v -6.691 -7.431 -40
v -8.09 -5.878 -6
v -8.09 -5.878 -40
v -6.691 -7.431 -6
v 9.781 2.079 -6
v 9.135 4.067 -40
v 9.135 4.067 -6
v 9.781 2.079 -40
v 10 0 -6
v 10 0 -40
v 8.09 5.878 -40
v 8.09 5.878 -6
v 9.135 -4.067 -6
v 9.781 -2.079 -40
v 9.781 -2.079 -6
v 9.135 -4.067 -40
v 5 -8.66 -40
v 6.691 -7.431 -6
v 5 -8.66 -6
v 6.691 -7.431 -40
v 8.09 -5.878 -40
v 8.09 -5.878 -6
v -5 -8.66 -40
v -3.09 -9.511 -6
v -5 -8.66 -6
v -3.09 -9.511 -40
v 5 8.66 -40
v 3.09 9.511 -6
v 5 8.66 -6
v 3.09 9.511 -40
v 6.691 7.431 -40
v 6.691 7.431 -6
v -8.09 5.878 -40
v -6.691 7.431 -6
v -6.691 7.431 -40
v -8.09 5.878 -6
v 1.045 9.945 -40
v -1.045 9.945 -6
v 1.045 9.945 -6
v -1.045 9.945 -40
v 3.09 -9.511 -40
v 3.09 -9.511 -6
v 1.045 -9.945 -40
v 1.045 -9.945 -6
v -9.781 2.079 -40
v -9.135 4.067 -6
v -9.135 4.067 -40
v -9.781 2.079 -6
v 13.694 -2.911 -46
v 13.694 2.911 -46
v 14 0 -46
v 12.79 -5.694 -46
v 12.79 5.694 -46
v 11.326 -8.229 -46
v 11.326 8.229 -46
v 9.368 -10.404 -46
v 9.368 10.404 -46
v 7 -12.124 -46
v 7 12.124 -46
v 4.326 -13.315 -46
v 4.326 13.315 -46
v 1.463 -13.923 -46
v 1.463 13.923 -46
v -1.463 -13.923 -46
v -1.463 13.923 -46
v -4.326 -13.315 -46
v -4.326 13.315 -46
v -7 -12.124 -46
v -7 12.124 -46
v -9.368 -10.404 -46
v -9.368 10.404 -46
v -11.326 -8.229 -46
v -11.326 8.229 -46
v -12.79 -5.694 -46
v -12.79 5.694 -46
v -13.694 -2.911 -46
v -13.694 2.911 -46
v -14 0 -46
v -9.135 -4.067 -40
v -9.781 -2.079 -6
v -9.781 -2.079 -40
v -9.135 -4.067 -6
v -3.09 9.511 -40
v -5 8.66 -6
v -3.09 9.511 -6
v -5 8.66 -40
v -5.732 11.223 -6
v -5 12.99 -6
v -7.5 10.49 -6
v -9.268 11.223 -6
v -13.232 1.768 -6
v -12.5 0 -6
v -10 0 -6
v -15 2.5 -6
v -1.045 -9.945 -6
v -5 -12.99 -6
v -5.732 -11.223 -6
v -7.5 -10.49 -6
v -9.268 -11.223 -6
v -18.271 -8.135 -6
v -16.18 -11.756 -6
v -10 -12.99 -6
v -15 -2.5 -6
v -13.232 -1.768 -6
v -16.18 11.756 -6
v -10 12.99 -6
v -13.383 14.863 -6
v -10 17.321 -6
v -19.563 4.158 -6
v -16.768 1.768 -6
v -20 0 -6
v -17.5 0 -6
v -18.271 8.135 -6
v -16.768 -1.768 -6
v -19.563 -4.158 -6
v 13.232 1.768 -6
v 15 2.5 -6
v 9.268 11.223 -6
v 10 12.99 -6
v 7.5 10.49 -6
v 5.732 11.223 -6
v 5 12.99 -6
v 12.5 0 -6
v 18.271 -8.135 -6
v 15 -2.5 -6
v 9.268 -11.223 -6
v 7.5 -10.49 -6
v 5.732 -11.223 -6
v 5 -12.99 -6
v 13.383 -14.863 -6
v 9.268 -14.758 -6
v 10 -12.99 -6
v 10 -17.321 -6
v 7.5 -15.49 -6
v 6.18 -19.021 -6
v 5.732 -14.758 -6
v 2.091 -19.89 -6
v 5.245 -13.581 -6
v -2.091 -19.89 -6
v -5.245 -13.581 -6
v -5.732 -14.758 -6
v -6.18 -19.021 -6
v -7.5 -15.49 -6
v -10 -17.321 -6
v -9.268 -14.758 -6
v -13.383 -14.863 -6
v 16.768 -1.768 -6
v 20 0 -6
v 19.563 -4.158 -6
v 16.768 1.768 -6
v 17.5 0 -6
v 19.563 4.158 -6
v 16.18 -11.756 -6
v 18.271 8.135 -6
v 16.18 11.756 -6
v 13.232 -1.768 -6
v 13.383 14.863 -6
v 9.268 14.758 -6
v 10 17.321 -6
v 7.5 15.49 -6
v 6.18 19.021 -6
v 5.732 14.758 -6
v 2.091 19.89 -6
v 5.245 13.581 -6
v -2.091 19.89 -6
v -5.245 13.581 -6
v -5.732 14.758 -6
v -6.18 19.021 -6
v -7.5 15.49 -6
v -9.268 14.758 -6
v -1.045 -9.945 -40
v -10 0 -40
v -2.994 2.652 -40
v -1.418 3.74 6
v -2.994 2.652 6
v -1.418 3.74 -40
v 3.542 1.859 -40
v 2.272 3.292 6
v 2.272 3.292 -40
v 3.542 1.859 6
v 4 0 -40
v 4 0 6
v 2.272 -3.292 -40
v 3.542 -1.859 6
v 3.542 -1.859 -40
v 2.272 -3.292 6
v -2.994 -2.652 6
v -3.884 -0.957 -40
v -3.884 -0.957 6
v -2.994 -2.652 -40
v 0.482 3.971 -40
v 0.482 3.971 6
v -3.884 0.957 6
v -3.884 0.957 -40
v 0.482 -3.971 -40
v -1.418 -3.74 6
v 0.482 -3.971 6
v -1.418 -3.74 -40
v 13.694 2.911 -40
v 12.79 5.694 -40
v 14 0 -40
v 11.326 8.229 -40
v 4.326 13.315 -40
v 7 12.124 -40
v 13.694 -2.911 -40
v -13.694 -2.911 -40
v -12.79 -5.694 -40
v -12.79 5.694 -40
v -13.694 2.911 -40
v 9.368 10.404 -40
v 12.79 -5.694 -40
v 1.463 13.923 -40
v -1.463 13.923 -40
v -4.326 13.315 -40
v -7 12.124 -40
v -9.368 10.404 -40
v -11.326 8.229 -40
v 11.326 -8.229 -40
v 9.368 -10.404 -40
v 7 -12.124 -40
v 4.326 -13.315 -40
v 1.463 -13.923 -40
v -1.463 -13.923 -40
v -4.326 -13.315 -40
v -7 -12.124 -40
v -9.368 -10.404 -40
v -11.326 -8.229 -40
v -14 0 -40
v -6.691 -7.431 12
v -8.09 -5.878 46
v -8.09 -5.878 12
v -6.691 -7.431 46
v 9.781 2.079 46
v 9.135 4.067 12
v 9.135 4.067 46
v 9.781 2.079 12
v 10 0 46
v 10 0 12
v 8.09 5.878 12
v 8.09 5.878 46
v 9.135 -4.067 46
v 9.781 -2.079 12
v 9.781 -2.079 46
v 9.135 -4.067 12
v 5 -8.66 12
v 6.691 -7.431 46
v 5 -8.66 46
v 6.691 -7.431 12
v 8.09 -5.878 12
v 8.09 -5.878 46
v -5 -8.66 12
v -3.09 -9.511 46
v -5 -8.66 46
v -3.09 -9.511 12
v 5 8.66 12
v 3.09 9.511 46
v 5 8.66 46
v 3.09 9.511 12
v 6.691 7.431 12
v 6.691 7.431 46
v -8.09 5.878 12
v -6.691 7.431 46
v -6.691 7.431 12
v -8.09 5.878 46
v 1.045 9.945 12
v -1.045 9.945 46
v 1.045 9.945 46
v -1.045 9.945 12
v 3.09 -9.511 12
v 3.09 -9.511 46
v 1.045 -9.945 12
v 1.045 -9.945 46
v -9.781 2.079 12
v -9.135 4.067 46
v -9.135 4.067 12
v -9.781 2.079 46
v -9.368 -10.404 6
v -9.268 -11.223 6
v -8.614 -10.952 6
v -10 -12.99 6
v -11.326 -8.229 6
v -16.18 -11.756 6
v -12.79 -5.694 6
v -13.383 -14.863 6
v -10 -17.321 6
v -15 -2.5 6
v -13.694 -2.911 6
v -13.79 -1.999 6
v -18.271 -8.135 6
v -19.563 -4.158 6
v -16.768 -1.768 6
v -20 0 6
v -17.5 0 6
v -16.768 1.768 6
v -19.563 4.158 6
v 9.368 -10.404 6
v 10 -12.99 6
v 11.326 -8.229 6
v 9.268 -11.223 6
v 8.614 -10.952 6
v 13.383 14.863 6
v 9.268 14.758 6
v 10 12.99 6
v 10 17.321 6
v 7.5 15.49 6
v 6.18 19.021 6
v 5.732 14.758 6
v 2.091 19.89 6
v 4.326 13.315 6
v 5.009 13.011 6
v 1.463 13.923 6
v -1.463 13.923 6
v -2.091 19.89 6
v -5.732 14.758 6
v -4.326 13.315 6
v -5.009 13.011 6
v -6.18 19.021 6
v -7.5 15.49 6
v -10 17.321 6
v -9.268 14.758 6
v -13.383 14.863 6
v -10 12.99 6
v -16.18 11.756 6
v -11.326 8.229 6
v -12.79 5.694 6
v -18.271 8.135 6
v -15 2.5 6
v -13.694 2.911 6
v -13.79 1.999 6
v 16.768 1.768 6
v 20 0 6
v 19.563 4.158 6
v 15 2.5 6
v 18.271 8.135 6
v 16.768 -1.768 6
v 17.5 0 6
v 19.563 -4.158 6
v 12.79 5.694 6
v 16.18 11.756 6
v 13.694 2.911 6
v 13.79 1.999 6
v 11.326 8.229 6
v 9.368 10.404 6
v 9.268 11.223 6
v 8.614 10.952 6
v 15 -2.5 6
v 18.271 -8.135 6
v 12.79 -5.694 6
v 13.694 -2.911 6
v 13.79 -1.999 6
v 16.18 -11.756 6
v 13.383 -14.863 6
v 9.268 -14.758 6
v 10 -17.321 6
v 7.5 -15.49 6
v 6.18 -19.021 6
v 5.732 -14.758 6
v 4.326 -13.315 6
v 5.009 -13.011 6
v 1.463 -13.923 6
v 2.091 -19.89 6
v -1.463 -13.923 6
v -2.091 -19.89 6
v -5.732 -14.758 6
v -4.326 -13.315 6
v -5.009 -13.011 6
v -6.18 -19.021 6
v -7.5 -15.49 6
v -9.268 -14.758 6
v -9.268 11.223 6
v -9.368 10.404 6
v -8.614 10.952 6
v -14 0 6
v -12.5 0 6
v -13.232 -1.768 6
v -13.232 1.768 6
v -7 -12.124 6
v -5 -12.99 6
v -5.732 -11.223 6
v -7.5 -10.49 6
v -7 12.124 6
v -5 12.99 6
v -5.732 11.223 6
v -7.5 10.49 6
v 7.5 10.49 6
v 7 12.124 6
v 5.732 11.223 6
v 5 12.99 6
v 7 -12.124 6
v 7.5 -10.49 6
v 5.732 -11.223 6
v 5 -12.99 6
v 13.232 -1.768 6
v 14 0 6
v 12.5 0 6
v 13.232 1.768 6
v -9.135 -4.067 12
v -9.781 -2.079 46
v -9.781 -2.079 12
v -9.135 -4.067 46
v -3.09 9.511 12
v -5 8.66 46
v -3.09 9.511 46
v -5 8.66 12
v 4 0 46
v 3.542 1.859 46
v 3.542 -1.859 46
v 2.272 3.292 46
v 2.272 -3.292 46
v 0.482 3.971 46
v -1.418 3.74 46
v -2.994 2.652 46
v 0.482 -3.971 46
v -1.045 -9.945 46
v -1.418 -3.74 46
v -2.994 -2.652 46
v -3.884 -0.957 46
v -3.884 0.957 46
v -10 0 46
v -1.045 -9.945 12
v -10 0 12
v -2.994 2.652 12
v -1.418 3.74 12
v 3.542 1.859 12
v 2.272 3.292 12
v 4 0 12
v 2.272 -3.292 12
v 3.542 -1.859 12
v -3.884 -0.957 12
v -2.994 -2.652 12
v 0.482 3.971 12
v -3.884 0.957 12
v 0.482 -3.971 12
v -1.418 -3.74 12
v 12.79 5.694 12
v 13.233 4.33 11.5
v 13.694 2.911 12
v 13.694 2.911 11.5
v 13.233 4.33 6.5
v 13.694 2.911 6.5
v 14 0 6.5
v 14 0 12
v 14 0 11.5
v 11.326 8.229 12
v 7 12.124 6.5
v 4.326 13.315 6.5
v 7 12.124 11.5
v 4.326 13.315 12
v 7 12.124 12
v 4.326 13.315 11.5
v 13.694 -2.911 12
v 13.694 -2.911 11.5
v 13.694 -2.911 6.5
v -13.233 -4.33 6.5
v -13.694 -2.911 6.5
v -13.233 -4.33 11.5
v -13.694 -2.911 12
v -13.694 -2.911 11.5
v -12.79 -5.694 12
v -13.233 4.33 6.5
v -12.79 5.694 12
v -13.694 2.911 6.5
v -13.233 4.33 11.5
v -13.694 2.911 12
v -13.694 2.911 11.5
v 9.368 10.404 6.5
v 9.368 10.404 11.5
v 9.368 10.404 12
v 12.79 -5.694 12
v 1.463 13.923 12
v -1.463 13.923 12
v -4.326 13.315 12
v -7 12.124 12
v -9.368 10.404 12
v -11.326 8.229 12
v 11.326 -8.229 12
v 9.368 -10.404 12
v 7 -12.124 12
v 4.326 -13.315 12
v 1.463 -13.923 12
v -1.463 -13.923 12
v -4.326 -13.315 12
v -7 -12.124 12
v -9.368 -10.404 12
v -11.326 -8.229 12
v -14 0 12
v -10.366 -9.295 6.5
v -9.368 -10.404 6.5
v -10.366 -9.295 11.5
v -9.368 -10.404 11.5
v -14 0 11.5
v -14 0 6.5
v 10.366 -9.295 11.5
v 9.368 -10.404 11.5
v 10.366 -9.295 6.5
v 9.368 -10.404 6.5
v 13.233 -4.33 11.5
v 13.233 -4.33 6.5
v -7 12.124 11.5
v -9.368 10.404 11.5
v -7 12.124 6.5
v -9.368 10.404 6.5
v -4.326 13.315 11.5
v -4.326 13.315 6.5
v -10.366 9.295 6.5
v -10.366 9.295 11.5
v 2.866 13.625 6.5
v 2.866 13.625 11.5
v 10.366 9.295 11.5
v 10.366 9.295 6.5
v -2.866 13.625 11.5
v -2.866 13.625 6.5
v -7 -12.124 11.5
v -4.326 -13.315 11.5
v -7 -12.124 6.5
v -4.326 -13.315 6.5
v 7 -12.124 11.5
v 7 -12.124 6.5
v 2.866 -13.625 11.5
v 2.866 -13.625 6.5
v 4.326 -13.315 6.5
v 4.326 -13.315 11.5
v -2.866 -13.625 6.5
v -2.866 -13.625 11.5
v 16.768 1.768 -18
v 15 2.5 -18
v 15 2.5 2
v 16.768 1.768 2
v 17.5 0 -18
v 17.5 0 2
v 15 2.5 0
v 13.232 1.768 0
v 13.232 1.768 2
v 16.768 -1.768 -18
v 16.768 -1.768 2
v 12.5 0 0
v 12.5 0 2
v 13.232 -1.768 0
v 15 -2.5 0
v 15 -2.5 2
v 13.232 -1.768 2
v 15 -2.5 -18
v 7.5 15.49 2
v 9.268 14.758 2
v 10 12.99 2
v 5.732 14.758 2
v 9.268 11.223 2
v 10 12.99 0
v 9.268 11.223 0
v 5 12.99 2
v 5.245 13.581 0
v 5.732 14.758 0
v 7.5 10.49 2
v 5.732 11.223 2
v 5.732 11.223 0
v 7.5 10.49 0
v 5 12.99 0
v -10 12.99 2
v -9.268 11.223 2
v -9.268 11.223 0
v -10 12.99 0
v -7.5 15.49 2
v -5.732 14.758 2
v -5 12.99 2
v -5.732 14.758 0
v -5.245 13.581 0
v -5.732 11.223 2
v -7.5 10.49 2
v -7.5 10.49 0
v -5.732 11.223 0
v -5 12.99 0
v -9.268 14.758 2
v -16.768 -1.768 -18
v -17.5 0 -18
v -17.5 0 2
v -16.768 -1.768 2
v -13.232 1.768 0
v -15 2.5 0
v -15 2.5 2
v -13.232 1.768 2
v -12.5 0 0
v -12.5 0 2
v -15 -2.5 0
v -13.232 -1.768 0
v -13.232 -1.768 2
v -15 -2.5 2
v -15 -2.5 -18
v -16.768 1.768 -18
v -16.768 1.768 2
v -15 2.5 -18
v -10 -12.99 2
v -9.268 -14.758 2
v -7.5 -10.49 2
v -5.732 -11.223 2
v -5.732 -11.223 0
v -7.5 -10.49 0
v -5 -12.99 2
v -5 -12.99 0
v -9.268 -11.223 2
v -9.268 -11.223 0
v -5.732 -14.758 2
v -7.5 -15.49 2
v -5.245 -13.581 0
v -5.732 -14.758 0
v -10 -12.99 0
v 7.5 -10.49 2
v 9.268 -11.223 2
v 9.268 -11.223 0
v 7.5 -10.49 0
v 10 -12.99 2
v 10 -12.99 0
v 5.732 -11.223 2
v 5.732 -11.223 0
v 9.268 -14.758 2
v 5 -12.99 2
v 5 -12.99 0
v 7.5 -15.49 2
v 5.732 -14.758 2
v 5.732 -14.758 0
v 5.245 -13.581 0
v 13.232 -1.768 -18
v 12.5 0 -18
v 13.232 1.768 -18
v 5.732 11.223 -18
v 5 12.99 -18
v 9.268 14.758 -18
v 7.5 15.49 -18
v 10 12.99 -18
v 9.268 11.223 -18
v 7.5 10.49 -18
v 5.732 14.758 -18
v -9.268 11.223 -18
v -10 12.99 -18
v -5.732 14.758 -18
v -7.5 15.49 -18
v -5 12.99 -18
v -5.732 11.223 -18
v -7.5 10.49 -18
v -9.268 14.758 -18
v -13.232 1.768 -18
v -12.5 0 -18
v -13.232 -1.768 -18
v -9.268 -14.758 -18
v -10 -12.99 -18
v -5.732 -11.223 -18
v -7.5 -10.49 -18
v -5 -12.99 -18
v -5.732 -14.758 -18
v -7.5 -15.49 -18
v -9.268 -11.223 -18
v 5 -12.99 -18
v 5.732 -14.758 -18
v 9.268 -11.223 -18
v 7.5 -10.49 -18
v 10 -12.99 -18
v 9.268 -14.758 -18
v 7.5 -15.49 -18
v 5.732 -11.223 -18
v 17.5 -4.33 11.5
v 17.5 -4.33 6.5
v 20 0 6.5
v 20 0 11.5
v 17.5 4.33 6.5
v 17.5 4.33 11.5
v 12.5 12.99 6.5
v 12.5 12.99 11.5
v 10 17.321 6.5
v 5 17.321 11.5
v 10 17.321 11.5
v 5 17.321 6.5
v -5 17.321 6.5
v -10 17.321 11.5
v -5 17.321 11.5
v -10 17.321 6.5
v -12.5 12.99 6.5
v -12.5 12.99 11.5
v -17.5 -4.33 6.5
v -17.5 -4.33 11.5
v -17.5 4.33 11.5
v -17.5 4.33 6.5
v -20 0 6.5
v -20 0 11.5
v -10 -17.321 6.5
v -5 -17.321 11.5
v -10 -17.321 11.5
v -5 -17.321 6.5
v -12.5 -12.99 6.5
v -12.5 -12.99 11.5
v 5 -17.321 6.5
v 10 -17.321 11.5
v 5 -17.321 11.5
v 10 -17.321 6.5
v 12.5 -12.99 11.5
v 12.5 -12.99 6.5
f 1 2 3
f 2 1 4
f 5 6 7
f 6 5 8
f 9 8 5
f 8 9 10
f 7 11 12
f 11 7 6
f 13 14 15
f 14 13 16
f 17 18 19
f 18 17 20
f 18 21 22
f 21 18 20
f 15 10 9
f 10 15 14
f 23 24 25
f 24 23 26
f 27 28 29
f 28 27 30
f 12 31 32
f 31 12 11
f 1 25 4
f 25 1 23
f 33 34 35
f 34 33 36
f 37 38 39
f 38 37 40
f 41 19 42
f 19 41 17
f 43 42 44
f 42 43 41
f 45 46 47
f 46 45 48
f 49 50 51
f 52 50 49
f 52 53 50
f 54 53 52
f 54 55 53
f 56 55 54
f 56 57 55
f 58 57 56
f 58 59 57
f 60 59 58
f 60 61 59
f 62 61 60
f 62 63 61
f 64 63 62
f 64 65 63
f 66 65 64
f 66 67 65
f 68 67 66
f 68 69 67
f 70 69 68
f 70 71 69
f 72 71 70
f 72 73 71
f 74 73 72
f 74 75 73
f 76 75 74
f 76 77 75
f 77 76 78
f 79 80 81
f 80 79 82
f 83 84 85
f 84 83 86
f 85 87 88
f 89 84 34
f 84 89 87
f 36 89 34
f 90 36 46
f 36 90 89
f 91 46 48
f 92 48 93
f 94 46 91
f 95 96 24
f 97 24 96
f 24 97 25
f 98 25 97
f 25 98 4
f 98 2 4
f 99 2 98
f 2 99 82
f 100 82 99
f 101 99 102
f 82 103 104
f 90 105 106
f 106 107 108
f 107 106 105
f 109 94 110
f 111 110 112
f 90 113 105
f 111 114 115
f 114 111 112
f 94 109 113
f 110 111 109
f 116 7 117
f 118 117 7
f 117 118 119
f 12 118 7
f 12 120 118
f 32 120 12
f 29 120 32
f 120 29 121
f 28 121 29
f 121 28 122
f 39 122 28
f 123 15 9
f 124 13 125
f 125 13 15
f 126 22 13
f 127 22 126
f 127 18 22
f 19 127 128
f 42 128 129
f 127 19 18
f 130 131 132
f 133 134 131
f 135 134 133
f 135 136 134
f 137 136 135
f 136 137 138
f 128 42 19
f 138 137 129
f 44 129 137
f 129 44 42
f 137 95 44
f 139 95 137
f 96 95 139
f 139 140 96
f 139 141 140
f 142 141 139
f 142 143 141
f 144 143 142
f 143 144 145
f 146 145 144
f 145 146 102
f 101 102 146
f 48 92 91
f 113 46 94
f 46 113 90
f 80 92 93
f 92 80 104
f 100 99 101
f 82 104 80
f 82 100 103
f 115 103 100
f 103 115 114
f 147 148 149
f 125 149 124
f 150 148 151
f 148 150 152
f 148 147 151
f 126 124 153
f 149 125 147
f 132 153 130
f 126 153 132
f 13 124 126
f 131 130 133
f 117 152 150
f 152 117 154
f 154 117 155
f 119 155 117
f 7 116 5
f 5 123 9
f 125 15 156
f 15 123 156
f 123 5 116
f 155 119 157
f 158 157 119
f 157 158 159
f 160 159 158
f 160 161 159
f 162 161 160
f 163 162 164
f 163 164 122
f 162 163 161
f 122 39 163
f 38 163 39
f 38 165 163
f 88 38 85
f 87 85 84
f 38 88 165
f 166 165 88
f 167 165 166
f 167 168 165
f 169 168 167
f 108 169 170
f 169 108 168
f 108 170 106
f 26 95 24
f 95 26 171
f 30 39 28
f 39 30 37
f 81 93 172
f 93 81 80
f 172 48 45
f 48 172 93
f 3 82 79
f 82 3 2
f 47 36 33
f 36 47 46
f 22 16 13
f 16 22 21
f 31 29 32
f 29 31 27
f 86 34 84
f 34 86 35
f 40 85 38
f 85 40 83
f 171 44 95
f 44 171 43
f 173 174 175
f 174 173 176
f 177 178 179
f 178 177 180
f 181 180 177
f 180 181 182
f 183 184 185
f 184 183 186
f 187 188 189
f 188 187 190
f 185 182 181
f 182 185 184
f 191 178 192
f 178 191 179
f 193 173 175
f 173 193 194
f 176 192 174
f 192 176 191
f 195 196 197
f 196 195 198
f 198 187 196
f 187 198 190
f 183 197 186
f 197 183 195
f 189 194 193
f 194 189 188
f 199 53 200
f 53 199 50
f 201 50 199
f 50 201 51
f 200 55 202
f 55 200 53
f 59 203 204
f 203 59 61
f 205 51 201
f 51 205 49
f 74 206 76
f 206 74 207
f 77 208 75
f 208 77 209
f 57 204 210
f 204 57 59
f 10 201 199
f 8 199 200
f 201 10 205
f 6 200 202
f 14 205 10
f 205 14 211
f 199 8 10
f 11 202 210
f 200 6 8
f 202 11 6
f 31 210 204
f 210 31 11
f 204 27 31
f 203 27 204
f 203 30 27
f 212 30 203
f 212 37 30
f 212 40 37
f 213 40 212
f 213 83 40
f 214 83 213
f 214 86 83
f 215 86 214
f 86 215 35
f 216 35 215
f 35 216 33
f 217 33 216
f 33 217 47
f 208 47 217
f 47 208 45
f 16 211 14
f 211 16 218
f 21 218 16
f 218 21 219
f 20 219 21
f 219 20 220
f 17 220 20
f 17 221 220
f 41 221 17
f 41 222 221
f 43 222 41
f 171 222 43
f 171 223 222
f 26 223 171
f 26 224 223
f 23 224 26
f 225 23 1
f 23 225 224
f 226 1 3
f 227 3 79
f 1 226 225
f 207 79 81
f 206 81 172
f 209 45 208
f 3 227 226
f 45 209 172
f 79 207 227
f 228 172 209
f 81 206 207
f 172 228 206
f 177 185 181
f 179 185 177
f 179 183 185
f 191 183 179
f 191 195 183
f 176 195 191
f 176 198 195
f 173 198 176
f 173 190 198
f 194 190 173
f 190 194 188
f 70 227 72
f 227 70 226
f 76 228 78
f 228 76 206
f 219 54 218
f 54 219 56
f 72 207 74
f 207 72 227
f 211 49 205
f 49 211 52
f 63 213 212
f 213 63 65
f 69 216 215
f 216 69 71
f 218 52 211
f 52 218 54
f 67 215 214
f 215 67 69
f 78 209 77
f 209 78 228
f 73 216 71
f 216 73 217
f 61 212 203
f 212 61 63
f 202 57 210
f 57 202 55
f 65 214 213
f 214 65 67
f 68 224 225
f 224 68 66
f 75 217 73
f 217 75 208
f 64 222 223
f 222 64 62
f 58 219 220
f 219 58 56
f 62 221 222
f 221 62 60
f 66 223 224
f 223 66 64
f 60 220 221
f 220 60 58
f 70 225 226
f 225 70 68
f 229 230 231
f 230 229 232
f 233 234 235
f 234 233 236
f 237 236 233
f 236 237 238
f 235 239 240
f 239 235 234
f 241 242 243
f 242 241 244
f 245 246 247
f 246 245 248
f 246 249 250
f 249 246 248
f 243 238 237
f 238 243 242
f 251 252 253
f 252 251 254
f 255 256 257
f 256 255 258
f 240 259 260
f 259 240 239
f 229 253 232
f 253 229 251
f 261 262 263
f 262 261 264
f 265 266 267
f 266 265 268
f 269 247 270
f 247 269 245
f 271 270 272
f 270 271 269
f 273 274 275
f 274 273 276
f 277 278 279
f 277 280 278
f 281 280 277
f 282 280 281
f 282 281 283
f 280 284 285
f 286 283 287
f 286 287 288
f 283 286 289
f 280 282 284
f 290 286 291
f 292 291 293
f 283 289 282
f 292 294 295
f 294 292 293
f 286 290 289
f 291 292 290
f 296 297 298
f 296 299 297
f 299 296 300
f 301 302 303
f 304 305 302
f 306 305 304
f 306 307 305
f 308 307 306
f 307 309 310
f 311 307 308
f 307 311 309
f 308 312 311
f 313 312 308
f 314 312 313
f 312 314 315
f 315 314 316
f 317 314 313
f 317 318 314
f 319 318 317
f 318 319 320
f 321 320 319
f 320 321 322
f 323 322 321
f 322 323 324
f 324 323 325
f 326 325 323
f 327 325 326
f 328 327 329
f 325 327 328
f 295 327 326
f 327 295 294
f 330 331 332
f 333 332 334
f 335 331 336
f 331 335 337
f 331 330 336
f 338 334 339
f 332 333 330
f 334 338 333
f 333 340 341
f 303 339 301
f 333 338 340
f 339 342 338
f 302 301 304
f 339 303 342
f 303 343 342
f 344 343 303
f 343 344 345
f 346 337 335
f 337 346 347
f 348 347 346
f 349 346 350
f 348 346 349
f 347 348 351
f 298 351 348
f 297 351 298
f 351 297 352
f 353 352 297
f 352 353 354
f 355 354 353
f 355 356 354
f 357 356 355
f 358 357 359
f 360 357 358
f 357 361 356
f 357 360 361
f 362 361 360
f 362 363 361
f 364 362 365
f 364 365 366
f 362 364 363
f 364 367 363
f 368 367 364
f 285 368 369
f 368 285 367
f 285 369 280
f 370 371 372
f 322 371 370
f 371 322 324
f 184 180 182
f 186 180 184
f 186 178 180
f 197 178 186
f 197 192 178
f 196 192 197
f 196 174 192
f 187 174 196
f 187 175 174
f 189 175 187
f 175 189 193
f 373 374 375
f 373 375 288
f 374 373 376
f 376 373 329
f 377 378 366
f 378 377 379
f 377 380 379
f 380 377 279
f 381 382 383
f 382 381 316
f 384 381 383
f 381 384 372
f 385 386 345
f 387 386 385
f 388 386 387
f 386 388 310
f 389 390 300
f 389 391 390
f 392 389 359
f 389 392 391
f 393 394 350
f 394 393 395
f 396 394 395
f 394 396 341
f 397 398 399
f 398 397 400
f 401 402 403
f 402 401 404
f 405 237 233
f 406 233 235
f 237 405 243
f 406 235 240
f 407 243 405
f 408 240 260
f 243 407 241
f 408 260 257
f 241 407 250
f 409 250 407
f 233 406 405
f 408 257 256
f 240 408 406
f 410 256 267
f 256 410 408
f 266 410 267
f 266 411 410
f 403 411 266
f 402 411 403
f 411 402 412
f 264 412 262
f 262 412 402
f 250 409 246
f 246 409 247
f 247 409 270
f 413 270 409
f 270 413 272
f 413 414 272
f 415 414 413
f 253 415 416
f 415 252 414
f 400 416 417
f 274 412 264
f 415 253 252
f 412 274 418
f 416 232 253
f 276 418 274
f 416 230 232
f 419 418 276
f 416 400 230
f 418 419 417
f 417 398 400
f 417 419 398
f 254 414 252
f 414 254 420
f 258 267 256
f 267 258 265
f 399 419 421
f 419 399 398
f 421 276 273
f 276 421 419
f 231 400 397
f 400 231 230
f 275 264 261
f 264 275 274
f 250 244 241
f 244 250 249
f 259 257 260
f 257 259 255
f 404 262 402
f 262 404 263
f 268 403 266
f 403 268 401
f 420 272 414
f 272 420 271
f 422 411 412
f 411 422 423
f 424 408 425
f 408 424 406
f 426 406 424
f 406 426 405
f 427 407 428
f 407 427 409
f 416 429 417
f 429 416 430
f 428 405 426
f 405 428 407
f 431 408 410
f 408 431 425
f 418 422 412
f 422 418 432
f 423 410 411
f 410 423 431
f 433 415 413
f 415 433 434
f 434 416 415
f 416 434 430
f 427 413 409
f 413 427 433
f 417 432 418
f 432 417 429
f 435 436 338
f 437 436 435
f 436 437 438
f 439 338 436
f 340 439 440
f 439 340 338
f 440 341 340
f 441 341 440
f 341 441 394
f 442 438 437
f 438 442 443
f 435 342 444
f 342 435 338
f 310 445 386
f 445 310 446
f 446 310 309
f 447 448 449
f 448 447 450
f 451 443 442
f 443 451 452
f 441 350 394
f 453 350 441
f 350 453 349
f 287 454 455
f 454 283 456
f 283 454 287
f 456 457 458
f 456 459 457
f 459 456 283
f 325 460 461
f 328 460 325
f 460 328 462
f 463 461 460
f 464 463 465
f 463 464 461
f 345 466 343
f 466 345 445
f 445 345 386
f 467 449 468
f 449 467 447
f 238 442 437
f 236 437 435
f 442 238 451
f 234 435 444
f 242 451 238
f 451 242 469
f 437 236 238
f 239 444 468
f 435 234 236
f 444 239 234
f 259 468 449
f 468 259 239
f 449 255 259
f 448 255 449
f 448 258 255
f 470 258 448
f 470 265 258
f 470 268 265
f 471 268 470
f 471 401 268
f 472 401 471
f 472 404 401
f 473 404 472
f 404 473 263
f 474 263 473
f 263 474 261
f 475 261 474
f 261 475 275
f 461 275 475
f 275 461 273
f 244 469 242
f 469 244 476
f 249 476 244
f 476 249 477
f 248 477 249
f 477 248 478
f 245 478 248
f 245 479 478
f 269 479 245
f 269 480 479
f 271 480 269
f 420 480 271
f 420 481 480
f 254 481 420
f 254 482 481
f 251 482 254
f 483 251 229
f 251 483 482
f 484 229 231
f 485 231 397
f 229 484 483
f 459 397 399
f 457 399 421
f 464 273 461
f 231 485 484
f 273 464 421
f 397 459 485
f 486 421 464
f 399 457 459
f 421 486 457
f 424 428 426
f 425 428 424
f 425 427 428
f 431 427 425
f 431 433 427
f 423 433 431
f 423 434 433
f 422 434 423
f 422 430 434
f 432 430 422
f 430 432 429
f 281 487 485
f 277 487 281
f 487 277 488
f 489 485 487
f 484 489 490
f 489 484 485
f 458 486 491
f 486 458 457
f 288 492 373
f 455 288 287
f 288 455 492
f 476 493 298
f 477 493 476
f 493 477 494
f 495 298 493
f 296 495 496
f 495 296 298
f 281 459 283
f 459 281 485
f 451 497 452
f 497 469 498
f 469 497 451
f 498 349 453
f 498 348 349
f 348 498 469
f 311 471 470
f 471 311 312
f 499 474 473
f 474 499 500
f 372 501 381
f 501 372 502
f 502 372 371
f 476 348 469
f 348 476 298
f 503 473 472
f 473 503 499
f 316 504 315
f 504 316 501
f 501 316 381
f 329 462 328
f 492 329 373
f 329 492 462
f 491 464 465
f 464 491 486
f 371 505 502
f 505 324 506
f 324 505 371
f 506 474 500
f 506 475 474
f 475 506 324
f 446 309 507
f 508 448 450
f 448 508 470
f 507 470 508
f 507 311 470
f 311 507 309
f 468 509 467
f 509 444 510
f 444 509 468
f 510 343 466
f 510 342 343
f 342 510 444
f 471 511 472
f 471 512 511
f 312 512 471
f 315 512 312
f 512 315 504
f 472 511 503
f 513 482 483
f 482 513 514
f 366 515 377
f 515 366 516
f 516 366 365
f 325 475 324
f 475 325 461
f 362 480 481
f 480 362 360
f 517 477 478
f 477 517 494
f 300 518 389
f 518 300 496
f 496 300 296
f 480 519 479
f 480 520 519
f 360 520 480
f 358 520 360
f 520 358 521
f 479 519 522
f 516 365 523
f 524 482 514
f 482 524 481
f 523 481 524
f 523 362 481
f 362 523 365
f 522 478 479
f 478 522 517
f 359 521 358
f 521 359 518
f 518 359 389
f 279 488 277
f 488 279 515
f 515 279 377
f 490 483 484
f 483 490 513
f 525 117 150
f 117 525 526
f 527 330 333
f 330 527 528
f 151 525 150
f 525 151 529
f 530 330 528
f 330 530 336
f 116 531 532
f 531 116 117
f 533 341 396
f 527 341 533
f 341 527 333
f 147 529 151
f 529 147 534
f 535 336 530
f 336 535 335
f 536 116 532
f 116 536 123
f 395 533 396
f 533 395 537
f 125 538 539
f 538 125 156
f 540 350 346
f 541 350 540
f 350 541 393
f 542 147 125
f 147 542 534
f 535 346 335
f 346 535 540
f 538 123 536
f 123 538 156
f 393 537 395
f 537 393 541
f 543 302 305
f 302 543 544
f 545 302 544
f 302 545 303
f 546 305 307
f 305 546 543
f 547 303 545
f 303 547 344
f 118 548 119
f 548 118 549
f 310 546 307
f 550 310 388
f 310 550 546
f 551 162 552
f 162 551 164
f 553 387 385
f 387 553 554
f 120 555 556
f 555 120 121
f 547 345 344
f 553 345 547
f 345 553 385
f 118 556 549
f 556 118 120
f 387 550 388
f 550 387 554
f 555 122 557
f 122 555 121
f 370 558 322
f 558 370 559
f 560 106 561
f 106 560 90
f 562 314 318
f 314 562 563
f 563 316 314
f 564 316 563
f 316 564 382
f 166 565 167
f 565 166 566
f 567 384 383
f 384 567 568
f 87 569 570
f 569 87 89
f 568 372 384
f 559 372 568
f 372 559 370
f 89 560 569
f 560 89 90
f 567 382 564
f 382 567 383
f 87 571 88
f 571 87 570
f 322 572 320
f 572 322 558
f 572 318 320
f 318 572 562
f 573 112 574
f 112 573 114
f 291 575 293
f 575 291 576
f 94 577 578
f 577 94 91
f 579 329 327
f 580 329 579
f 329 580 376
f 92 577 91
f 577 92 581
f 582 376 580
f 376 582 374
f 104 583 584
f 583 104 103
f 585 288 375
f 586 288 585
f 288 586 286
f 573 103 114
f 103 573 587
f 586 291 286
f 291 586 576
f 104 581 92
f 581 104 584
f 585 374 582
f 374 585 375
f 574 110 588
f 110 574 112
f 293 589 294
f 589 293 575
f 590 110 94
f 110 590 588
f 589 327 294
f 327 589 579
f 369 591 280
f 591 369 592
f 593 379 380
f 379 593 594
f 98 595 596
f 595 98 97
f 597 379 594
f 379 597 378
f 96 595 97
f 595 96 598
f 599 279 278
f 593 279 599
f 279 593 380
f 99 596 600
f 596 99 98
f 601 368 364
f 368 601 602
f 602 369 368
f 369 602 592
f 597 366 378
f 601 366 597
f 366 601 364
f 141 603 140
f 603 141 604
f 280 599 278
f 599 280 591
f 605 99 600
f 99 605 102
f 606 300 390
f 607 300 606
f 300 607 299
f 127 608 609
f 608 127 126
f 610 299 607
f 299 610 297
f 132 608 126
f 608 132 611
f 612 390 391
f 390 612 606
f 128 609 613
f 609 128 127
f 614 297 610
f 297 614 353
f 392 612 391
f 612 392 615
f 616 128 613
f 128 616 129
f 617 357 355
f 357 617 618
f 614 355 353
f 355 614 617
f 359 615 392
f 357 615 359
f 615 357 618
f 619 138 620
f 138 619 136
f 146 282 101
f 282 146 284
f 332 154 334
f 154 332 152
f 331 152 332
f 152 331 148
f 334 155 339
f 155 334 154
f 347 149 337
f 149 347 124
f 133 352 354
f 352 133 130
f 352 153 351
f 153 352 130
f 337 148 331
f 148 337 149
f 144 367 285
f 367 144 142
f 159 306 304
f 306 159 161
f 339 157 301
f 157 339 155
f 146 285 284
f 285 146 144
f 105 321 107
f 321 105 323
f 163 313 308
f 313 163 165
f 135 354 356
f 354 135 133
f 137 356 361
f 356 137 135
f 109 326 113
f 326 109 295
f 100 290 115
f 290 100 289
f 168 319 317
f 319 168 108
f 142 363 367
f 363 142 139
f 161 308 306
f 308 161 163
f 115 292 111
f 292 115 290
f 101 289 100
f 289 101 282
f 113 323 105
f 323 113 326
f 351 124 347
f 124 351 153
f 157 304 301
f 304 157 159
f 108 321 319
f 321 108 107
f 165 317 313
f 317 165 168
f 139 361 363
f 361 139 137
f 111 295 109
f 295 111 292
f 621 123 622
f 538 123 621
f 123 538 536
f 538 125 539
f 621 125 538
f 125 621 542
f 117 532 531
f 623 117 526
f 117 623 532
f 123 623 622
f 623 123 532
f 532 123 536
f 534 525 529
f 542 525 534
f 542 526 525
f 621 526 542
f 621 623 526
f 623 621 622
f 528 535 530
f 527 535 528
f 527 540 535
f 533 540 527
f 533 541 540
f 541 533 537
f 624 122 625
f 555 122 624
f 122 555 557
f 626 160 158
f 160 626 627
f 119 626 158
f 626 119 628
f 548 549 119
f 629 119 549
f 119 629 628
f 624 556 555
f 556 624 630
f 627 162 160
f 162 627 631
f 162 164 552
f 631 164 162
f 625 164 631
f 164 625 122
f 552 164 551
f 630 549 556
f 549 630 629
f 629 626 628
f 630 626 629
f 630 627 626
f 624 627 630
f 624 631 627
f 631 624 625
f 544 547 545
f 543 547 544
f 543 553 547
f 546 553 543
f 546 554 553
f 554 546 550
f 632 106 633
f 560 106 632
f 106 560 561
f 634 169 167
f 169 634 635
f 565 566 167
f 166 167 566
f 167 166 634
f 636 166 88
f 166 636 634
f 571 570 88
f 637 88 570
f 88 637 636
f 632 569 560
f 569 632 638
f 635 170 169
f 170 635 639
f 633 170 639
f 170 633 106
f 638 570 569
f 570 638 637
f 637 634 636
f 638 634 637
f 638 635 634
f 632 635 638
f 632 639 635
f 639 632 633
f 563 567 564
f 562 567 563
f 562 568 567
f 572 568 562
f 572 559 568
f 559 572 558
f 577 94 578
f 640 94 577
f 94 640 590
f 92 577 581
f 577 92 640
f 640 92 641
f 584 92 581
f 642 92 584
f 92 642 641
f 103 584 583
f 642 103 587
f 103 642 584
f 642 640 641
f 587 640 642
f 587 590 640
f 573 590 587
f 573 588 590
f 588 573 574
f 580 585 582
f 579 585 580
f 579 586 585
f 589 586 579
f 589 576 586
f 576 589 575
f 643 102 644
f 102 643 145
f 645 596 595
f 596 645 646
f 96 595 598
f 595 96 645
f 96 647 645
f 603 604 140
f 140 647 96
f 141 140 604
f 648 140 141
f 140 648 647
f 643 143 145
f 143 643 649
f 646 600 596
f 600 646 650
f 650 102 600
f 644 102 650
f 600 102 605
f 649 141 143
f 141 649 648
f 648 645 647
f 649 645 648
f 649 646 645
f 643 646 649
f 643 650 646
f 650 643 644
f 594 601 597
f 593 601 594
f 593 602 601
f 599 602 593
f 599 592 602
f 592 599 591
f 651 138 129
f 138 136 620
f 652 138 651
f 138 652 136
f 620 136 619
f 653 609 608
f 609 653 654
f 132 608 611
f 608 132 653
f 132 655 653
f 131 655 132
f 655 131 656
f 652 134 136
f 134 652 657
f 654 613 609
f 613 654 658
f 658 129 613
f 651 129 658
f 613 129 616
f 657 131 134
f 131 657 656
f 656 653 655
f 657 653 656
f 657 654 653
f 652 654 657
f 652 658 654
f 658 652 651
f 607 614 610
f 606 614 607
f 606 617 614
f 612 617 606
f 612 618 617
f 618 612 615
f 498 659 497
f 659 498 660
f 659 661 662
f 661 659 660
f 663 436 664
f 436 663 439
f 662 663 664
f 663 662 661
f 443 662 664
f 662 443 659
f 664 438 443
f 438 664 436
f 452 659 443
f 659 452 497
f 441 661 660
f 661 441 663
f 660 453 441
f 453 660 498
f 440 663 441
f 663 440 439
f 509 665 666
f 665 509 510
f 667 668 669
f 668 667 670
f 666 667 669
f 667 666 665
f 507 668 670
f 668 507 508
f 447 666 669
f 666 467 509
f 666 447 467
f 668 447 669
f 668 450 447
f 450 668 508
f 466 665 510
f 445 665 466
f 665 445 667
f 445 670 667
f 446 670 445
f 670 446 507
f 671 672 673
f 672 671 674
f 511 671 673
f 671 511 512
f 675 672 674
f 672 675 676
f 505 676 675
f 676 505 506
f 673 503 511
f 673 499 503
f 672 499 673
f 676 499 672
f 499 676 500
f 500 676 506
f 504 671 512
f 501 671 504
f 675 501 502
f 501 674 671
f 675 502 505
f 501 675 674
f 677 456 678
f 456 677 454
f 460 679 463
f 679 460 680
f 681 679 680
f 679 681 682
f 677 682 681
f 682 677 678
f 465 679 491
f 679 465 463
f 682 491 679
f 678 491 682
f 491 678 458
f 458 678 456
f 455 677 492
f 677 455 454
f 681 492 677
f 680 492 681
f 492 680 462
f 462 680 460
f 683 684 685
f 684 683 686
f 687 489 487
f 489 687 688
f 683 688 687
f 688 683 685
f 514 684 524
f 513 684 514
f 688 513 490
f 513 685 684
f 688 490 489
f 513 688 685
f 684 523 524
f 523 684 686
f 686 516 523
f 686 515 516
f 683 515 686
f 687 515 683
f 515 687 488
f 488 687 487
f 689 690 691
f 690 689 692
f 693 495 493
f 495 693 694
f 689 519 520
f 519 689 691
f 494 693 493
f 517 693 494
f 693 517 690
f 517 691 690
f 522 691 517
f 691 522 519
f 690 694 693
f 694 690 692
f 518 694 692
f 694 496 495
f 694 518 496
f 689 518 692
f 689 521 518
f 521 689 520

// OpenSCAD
// Parameters
shaft_length = 40; // Adjusted shaft length for smoother transition
shaft_diameter = 20; // Adjusted diameter for uniformity
shaft_hole_diameter = 8;
shaft_wider_end_diameter = 28; // Slightly reduced for smoother transition
shaft_wider_end_thickness = 6; // Adjusted for a more streamlined look
flange_diameter = 40; // Adjusted flange size
flange_thickness = 6; // Adjusted thickness for a smoother look
bolt_hole_diameter = 5;
bolt_count = 6;
bolt_length = 18; // Adjusted bolt length for better distinction
bolt_diameter = 5;
nut_diameter = 10; // Ensuring distinct hexagonal nuts
nut_thickness = 5;
diaphragm_thickness = 3; // More visible flexible diaphragm
diaphragm_diameter = 38; // Adjusted diaphragm size
bolt_circle_radius = 15; // Adjusted bolt circle radius

// Function to create a shaft with a smoother transition
module shaft() {
    difference() {
        cylinder(h = shaft_length, d = shaft_diameter, center = true);
        cylinder(h = shaft_length + 2, d = shaft_hole_diameter, center = true);
    }
    // Wider end with smoother transition
    translate([0, 0, -shaft_length/2])
        cylinder(h = shaft_wider_end_thickness, d = shaft_wider_end_diameter, center = false);
}

// Function to create a flange plate with smoother edges
module flange_plate() {
    difference() {
        cylinder(h = flange_thickness, d = flange_diameter, center = true);
        cylinder(h = flange_thickness + 2, d = shaft_hole_diameter, center = true);
        
        // Bolt holes
        for (i = [0:bolt_count-1]) {
            angle = i * 360 / bolt_count;
            translate([bolt_circle_radius * cos(angle), bolt_circle_radius * sin(angle), 0])
                cylinder(h = flange_thickness + 2, d = bolt_hole_diameter, center = true);
        }
    }
}

// Function to create the flexible diaphragm with a layered structure
module flexible_diaphragm() {
    difference() {
        cylinder(h = diaphragm_thickness, d = diaphragm_diameter, center = true);
        cylinder(h = diaphragm_thickness + 2, d = shaft_hole_diameter, center = true);
        
        // Bolt holes
        for (i = [0:bolt_count-1]) {
            angle = i * 360 / bolt_count;
            translate([bolt_circle_radius * cos(angle), bolt_circle_radius * sin(angle), 0])
                cylinder(h = diaphragm_thickness + 2, d = bolt_hole_diameter, center = true);
        }
    }
}

// Function to create a distinct bolt
module bolt() {
    union() {
        cylinder(h = bolt_length, d = bolt_diameter, center = true);
        translate([0, 0, bolt_length/2])
            cylinder(h = 2, d = bolt_diameter + 2, center = false); // Bolt head
    }
}

// Function to create a distinct hexagonal nut
module nut() {
    cylinder(h = nut_thickness, d = nut_diameter, center = true, $fn=6);
}

// Assembly
module coupling_assembly() {
    // Left Shaft
    translate([0, 0, -shaft_length/2 - flange_thickness])
        shaft();
    
    // Right Shaft
    translate([0, 0, shaft_length/2 + flange_thickness])
        shaft();
    
    // Left Flange Plate
    translate([0, 0, -flange_thickness/2])
        flange_plate();
    
    // Right Flange Plate
    translate([0, 0, flange_thickness/2])
        flange_plate();
    
    // Flexible Diaphragm with a more visible structure
    translate([0, 0, 0])
        flexible_diaphragm();
    
    // Bolts and Nuts
    for (i = [0:bolt_count-1]) {
        angle = i * 360 / bolt_count;
        translate([bolt_circle_radius * cos(angle), bolt_circle_radius * sin(angle), -bolt_length/2])
            bolt();
        translate([bolt_circle_radius * cos(angle), bolt_circle_radius * sin(angle), bolt_length/2])
            nut();
    }
}

// Render the coupling assembly
coupling_assembly();
